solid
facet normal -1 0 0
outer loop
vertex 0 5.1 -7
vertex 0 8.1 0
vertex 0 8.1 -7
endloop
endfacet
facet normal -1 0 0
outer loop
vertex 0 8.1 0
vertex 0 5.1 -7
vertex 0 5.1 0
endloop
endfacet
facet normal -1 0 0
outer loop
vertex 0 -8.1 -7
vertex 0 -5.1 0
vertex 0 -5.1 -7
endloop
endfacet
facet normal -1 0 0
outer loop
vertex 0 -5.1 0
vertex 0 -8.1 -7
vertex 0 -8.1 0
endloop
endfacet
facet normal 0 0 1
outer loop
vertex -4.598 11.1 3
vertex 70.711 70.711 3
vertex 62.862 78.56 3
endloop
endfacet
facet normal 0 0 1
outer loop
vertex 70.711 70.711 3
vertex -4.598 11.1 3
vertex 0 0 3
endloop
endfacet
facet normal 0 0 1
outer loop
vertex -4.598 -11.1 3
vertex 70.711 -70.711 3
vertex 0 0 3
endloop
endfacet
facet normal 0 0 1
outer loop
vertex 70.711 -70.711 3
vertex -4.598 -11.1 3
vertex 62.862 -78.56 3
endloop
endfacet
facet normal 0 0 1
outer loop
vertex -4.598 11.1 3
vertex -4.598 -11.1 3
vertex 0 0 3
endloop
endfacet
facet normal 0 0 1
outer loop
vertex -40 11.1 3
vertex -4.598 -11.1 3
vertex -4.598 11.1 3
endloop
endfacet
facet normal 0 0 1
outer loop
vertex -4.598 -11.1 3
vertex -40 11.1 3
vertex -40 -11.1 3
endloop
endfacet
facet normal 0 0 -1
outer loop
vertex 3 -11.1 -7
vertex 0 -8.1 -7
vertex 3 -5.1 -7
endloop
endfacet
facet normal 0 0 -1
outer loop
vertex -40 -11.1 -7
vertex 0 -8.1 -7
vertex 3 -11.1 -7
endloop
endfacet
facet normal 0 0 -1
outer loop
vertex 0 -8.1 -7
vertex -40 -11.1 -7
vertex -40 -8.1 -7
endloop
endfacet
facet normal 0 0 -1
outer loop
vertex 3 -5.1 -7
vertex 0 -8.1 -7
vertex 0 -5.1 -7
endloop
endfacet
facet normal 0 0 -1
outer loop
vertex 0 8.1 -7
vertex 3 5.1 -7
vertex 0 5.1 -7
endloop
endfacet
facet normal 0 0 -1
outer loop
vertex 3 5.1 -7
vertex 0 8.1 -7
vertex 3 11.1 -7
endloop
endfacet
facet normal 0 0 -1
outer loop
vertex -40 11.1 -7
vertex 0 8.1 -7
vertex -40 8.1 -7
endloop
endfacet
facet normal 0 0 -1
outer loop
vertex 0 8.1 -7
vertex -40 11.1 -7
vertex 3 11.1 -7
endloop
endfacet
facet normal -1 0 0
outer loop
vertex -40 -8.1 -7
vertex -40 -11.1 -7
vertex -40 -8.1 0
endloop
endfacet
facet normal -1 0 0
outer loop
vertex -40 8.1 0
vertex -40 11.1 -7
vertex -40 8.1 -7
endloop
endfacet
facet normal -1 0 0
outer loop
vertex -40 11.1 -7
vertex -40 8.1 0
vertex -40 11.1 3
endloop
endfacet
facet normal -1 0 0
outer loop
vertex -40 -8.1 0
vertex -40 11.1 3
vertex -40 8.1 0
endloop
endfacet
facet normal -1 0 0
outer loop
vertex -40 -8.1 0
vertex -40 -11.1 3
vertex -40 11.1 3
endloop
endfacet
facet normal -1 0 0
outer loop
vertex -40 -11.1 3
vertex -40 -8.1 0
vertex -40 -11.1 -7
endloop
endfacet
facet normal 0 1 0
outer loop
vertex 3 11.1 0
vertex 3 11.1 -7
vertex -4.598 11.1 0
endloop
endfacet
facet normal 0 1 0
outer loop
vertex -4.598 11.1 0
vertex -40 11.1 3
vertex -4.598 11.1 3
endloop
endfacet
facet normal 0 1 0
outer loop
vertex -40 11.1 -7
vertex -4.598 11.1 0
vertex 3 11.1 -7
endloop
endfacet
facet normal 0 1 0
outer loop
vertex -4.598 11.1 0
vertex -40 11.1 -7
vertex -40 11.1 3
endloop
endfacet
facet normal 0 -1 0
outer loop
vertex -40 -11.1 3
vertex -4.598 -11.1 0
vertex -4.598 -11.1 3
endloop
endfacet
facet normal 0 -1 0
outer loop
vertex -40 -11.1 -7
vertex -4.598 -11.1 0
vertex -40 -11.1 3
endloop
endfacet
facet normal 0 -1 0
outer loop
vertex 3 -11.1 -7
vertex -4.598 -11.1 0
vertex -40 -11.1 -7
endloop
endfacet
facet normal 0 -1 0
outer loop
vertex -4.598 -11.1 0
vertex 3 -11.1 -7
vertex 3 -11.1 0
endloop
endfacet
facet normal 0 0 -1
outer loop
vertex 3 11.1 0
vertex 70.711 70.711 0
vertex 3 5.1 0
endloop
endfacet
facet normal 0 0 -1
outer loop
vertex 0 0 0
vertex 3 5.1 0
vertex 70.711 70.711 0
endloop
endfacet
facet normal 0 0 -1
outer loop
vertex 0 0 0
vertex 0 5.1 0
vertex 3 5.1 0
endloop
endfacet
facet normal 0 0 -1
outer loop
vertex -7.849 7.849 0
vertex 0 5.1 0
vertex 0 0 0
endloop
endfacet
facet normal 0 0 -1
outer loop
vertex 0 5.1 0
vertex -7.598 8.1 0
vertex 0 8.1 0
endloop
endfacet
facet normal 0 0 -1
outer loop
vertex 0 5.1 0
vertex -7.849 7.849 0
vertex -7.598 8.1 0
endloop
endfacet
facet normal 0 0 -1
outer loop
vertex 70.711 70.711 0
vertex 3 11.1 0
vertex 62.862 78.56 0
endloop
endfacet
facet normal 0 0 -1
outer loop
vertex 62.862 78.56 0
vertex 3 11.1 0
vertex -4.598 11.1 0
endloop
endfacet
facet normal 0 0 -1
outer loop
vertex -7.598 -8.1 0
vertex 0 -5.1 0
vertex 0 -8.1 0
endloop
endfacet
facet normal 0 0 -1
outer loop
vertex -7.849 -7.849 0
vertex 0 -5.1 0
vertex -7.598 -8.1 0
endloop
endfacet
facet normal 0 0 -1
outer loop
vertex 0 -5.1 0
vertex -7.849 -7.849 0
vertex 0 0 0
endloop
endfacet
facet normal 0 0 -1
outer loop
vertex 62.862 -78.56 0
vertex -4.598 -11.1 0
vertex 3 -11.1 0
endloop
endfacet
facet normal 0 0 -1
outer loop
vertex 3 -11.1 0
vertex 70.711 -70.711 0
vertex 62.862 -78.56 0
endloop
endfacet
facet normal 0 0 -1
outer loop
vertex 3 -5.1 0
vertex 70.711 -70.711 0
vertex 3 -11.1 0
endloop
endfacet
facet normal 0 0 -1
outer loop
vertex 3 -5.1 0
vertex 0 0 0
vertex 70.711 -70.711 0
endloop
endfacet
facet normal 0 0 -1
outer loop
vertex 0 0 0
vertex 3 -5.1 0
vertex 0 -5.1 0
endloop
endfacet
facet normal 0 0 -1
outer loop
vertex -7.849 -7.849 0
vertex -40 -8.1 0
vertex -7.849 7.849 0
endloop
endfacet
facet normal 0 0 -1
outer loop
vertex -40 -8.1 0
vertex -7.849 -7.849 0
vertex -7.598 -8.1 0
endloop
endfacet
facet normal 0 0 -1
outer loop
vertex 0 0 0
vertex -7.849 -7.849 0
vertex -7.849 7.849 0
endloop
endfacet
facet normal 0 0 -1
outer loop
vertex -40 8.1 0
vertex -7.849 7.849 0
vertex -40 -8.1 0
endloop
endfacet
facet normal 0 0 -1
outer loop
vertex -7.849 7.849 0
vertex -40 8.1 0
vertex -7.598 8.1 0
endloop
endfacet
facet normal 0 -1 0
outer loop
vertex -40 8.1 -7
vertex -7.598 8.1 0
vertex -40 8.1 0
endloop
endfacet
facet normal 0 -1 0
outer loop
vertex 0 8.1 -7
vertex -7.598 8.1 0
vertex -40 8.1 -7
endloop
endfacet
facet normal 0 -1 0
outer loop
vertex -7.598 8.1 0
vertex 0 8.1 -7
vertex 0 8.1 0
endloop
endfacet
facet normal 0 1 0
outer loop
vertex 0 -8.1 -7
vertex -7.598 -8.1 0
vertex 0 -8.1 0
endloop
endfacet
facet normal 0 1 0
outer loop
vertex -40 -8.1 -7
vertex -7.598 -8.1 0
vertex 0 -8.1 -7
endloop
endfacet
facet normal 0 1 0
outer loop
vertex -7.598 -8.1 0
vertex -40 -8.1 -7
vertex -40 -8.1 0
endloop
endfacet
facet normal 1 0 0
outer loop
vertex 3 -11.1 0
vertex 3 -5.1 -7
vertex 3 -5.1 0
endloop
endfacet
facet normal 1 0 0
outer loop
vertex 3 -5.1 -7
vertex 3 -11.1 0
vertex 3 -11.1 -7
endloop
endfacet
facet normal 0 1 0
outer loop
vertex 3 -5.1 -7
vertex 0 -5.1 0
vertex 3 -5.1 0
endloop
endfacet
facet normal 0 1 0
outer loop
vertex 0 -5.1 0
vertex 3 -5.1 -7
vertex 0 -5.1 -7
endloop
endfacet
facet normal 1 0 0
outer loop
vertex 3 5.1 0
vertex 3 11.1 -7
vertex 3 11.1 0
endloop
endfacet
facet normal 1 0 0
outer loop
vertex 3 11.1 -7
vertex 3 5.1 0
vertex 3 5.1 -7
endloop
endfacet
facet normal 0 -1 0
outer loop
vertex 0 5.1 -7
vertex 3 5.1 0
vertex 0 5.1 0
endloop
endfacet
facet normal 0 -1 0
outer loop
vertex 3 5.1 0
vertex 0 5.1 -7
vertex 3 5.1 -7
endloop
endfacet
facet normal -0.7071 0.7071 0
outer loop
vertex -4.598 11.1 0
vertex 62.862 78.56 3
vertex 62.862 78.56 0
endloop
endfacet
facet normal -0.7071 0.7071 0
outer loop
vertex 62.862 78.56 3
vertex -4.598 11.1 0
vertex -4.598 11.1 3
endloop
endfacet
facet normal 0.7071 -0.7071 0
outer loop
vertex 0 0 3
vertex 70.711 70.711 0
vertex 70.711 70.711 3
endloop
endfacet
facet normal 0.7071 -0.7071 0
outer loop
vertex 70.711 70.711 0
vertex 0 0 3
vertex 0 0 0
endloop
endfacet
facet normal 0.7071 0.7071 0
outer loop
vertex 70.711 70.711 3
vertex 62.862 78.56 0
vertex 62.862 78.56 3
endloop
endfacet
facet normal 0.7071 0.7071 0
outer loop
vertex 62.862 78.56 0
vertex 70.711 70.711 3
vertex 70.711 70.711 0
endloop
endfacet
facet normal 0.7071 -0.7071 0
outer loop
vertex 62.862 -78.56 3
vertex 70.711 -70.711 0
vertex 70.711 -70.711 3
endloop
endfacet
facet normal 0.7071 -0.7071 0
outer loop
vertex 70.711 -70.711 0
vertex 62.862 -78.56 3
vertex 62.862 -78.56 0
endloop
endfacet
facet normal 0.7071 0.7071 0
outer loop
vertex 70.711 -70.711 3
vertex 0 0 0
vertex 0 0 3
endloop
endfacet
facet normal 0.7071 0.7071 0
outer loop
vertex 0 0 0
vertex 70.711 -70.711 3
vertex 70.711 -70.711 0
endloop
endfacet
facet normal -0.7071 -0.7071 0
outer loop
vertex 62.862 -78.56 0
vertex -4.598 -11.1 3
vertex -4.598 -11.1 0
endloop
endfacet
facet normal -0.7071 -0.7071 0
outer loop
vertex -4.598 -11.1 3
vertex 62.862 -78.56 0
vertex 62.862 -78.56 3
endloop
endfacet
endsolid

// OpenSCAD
CaliperWidth = 16;

module radius(){
    w = CaliperWidth + 0.2; // Tolerancia
    translate([0,0,-10 + 3]) {
        difference(){
            translate([-40,-(w + 6)/2,0]) cube([40,w + 6,10],center=false);
            translate([-40 - 0.001,-w/2,-3]) cube([40 + 0.002, w, 10],center=false);
        }
        translate([0,-(w + 6)/2,0]) cube([3,6,10],center=false);
        translate([0,(w + 6)/2-6,0]) cube([3,6,10],center=false);
    }
    rotate([0,0,45]) cube([100,(w + 6)/2,3],center=false);
    rotate([0,0,-45]) translate([0,-(w + 6)/2,0]) cube([100,(w + 6)/2,3],center=false);        
}

radius();
